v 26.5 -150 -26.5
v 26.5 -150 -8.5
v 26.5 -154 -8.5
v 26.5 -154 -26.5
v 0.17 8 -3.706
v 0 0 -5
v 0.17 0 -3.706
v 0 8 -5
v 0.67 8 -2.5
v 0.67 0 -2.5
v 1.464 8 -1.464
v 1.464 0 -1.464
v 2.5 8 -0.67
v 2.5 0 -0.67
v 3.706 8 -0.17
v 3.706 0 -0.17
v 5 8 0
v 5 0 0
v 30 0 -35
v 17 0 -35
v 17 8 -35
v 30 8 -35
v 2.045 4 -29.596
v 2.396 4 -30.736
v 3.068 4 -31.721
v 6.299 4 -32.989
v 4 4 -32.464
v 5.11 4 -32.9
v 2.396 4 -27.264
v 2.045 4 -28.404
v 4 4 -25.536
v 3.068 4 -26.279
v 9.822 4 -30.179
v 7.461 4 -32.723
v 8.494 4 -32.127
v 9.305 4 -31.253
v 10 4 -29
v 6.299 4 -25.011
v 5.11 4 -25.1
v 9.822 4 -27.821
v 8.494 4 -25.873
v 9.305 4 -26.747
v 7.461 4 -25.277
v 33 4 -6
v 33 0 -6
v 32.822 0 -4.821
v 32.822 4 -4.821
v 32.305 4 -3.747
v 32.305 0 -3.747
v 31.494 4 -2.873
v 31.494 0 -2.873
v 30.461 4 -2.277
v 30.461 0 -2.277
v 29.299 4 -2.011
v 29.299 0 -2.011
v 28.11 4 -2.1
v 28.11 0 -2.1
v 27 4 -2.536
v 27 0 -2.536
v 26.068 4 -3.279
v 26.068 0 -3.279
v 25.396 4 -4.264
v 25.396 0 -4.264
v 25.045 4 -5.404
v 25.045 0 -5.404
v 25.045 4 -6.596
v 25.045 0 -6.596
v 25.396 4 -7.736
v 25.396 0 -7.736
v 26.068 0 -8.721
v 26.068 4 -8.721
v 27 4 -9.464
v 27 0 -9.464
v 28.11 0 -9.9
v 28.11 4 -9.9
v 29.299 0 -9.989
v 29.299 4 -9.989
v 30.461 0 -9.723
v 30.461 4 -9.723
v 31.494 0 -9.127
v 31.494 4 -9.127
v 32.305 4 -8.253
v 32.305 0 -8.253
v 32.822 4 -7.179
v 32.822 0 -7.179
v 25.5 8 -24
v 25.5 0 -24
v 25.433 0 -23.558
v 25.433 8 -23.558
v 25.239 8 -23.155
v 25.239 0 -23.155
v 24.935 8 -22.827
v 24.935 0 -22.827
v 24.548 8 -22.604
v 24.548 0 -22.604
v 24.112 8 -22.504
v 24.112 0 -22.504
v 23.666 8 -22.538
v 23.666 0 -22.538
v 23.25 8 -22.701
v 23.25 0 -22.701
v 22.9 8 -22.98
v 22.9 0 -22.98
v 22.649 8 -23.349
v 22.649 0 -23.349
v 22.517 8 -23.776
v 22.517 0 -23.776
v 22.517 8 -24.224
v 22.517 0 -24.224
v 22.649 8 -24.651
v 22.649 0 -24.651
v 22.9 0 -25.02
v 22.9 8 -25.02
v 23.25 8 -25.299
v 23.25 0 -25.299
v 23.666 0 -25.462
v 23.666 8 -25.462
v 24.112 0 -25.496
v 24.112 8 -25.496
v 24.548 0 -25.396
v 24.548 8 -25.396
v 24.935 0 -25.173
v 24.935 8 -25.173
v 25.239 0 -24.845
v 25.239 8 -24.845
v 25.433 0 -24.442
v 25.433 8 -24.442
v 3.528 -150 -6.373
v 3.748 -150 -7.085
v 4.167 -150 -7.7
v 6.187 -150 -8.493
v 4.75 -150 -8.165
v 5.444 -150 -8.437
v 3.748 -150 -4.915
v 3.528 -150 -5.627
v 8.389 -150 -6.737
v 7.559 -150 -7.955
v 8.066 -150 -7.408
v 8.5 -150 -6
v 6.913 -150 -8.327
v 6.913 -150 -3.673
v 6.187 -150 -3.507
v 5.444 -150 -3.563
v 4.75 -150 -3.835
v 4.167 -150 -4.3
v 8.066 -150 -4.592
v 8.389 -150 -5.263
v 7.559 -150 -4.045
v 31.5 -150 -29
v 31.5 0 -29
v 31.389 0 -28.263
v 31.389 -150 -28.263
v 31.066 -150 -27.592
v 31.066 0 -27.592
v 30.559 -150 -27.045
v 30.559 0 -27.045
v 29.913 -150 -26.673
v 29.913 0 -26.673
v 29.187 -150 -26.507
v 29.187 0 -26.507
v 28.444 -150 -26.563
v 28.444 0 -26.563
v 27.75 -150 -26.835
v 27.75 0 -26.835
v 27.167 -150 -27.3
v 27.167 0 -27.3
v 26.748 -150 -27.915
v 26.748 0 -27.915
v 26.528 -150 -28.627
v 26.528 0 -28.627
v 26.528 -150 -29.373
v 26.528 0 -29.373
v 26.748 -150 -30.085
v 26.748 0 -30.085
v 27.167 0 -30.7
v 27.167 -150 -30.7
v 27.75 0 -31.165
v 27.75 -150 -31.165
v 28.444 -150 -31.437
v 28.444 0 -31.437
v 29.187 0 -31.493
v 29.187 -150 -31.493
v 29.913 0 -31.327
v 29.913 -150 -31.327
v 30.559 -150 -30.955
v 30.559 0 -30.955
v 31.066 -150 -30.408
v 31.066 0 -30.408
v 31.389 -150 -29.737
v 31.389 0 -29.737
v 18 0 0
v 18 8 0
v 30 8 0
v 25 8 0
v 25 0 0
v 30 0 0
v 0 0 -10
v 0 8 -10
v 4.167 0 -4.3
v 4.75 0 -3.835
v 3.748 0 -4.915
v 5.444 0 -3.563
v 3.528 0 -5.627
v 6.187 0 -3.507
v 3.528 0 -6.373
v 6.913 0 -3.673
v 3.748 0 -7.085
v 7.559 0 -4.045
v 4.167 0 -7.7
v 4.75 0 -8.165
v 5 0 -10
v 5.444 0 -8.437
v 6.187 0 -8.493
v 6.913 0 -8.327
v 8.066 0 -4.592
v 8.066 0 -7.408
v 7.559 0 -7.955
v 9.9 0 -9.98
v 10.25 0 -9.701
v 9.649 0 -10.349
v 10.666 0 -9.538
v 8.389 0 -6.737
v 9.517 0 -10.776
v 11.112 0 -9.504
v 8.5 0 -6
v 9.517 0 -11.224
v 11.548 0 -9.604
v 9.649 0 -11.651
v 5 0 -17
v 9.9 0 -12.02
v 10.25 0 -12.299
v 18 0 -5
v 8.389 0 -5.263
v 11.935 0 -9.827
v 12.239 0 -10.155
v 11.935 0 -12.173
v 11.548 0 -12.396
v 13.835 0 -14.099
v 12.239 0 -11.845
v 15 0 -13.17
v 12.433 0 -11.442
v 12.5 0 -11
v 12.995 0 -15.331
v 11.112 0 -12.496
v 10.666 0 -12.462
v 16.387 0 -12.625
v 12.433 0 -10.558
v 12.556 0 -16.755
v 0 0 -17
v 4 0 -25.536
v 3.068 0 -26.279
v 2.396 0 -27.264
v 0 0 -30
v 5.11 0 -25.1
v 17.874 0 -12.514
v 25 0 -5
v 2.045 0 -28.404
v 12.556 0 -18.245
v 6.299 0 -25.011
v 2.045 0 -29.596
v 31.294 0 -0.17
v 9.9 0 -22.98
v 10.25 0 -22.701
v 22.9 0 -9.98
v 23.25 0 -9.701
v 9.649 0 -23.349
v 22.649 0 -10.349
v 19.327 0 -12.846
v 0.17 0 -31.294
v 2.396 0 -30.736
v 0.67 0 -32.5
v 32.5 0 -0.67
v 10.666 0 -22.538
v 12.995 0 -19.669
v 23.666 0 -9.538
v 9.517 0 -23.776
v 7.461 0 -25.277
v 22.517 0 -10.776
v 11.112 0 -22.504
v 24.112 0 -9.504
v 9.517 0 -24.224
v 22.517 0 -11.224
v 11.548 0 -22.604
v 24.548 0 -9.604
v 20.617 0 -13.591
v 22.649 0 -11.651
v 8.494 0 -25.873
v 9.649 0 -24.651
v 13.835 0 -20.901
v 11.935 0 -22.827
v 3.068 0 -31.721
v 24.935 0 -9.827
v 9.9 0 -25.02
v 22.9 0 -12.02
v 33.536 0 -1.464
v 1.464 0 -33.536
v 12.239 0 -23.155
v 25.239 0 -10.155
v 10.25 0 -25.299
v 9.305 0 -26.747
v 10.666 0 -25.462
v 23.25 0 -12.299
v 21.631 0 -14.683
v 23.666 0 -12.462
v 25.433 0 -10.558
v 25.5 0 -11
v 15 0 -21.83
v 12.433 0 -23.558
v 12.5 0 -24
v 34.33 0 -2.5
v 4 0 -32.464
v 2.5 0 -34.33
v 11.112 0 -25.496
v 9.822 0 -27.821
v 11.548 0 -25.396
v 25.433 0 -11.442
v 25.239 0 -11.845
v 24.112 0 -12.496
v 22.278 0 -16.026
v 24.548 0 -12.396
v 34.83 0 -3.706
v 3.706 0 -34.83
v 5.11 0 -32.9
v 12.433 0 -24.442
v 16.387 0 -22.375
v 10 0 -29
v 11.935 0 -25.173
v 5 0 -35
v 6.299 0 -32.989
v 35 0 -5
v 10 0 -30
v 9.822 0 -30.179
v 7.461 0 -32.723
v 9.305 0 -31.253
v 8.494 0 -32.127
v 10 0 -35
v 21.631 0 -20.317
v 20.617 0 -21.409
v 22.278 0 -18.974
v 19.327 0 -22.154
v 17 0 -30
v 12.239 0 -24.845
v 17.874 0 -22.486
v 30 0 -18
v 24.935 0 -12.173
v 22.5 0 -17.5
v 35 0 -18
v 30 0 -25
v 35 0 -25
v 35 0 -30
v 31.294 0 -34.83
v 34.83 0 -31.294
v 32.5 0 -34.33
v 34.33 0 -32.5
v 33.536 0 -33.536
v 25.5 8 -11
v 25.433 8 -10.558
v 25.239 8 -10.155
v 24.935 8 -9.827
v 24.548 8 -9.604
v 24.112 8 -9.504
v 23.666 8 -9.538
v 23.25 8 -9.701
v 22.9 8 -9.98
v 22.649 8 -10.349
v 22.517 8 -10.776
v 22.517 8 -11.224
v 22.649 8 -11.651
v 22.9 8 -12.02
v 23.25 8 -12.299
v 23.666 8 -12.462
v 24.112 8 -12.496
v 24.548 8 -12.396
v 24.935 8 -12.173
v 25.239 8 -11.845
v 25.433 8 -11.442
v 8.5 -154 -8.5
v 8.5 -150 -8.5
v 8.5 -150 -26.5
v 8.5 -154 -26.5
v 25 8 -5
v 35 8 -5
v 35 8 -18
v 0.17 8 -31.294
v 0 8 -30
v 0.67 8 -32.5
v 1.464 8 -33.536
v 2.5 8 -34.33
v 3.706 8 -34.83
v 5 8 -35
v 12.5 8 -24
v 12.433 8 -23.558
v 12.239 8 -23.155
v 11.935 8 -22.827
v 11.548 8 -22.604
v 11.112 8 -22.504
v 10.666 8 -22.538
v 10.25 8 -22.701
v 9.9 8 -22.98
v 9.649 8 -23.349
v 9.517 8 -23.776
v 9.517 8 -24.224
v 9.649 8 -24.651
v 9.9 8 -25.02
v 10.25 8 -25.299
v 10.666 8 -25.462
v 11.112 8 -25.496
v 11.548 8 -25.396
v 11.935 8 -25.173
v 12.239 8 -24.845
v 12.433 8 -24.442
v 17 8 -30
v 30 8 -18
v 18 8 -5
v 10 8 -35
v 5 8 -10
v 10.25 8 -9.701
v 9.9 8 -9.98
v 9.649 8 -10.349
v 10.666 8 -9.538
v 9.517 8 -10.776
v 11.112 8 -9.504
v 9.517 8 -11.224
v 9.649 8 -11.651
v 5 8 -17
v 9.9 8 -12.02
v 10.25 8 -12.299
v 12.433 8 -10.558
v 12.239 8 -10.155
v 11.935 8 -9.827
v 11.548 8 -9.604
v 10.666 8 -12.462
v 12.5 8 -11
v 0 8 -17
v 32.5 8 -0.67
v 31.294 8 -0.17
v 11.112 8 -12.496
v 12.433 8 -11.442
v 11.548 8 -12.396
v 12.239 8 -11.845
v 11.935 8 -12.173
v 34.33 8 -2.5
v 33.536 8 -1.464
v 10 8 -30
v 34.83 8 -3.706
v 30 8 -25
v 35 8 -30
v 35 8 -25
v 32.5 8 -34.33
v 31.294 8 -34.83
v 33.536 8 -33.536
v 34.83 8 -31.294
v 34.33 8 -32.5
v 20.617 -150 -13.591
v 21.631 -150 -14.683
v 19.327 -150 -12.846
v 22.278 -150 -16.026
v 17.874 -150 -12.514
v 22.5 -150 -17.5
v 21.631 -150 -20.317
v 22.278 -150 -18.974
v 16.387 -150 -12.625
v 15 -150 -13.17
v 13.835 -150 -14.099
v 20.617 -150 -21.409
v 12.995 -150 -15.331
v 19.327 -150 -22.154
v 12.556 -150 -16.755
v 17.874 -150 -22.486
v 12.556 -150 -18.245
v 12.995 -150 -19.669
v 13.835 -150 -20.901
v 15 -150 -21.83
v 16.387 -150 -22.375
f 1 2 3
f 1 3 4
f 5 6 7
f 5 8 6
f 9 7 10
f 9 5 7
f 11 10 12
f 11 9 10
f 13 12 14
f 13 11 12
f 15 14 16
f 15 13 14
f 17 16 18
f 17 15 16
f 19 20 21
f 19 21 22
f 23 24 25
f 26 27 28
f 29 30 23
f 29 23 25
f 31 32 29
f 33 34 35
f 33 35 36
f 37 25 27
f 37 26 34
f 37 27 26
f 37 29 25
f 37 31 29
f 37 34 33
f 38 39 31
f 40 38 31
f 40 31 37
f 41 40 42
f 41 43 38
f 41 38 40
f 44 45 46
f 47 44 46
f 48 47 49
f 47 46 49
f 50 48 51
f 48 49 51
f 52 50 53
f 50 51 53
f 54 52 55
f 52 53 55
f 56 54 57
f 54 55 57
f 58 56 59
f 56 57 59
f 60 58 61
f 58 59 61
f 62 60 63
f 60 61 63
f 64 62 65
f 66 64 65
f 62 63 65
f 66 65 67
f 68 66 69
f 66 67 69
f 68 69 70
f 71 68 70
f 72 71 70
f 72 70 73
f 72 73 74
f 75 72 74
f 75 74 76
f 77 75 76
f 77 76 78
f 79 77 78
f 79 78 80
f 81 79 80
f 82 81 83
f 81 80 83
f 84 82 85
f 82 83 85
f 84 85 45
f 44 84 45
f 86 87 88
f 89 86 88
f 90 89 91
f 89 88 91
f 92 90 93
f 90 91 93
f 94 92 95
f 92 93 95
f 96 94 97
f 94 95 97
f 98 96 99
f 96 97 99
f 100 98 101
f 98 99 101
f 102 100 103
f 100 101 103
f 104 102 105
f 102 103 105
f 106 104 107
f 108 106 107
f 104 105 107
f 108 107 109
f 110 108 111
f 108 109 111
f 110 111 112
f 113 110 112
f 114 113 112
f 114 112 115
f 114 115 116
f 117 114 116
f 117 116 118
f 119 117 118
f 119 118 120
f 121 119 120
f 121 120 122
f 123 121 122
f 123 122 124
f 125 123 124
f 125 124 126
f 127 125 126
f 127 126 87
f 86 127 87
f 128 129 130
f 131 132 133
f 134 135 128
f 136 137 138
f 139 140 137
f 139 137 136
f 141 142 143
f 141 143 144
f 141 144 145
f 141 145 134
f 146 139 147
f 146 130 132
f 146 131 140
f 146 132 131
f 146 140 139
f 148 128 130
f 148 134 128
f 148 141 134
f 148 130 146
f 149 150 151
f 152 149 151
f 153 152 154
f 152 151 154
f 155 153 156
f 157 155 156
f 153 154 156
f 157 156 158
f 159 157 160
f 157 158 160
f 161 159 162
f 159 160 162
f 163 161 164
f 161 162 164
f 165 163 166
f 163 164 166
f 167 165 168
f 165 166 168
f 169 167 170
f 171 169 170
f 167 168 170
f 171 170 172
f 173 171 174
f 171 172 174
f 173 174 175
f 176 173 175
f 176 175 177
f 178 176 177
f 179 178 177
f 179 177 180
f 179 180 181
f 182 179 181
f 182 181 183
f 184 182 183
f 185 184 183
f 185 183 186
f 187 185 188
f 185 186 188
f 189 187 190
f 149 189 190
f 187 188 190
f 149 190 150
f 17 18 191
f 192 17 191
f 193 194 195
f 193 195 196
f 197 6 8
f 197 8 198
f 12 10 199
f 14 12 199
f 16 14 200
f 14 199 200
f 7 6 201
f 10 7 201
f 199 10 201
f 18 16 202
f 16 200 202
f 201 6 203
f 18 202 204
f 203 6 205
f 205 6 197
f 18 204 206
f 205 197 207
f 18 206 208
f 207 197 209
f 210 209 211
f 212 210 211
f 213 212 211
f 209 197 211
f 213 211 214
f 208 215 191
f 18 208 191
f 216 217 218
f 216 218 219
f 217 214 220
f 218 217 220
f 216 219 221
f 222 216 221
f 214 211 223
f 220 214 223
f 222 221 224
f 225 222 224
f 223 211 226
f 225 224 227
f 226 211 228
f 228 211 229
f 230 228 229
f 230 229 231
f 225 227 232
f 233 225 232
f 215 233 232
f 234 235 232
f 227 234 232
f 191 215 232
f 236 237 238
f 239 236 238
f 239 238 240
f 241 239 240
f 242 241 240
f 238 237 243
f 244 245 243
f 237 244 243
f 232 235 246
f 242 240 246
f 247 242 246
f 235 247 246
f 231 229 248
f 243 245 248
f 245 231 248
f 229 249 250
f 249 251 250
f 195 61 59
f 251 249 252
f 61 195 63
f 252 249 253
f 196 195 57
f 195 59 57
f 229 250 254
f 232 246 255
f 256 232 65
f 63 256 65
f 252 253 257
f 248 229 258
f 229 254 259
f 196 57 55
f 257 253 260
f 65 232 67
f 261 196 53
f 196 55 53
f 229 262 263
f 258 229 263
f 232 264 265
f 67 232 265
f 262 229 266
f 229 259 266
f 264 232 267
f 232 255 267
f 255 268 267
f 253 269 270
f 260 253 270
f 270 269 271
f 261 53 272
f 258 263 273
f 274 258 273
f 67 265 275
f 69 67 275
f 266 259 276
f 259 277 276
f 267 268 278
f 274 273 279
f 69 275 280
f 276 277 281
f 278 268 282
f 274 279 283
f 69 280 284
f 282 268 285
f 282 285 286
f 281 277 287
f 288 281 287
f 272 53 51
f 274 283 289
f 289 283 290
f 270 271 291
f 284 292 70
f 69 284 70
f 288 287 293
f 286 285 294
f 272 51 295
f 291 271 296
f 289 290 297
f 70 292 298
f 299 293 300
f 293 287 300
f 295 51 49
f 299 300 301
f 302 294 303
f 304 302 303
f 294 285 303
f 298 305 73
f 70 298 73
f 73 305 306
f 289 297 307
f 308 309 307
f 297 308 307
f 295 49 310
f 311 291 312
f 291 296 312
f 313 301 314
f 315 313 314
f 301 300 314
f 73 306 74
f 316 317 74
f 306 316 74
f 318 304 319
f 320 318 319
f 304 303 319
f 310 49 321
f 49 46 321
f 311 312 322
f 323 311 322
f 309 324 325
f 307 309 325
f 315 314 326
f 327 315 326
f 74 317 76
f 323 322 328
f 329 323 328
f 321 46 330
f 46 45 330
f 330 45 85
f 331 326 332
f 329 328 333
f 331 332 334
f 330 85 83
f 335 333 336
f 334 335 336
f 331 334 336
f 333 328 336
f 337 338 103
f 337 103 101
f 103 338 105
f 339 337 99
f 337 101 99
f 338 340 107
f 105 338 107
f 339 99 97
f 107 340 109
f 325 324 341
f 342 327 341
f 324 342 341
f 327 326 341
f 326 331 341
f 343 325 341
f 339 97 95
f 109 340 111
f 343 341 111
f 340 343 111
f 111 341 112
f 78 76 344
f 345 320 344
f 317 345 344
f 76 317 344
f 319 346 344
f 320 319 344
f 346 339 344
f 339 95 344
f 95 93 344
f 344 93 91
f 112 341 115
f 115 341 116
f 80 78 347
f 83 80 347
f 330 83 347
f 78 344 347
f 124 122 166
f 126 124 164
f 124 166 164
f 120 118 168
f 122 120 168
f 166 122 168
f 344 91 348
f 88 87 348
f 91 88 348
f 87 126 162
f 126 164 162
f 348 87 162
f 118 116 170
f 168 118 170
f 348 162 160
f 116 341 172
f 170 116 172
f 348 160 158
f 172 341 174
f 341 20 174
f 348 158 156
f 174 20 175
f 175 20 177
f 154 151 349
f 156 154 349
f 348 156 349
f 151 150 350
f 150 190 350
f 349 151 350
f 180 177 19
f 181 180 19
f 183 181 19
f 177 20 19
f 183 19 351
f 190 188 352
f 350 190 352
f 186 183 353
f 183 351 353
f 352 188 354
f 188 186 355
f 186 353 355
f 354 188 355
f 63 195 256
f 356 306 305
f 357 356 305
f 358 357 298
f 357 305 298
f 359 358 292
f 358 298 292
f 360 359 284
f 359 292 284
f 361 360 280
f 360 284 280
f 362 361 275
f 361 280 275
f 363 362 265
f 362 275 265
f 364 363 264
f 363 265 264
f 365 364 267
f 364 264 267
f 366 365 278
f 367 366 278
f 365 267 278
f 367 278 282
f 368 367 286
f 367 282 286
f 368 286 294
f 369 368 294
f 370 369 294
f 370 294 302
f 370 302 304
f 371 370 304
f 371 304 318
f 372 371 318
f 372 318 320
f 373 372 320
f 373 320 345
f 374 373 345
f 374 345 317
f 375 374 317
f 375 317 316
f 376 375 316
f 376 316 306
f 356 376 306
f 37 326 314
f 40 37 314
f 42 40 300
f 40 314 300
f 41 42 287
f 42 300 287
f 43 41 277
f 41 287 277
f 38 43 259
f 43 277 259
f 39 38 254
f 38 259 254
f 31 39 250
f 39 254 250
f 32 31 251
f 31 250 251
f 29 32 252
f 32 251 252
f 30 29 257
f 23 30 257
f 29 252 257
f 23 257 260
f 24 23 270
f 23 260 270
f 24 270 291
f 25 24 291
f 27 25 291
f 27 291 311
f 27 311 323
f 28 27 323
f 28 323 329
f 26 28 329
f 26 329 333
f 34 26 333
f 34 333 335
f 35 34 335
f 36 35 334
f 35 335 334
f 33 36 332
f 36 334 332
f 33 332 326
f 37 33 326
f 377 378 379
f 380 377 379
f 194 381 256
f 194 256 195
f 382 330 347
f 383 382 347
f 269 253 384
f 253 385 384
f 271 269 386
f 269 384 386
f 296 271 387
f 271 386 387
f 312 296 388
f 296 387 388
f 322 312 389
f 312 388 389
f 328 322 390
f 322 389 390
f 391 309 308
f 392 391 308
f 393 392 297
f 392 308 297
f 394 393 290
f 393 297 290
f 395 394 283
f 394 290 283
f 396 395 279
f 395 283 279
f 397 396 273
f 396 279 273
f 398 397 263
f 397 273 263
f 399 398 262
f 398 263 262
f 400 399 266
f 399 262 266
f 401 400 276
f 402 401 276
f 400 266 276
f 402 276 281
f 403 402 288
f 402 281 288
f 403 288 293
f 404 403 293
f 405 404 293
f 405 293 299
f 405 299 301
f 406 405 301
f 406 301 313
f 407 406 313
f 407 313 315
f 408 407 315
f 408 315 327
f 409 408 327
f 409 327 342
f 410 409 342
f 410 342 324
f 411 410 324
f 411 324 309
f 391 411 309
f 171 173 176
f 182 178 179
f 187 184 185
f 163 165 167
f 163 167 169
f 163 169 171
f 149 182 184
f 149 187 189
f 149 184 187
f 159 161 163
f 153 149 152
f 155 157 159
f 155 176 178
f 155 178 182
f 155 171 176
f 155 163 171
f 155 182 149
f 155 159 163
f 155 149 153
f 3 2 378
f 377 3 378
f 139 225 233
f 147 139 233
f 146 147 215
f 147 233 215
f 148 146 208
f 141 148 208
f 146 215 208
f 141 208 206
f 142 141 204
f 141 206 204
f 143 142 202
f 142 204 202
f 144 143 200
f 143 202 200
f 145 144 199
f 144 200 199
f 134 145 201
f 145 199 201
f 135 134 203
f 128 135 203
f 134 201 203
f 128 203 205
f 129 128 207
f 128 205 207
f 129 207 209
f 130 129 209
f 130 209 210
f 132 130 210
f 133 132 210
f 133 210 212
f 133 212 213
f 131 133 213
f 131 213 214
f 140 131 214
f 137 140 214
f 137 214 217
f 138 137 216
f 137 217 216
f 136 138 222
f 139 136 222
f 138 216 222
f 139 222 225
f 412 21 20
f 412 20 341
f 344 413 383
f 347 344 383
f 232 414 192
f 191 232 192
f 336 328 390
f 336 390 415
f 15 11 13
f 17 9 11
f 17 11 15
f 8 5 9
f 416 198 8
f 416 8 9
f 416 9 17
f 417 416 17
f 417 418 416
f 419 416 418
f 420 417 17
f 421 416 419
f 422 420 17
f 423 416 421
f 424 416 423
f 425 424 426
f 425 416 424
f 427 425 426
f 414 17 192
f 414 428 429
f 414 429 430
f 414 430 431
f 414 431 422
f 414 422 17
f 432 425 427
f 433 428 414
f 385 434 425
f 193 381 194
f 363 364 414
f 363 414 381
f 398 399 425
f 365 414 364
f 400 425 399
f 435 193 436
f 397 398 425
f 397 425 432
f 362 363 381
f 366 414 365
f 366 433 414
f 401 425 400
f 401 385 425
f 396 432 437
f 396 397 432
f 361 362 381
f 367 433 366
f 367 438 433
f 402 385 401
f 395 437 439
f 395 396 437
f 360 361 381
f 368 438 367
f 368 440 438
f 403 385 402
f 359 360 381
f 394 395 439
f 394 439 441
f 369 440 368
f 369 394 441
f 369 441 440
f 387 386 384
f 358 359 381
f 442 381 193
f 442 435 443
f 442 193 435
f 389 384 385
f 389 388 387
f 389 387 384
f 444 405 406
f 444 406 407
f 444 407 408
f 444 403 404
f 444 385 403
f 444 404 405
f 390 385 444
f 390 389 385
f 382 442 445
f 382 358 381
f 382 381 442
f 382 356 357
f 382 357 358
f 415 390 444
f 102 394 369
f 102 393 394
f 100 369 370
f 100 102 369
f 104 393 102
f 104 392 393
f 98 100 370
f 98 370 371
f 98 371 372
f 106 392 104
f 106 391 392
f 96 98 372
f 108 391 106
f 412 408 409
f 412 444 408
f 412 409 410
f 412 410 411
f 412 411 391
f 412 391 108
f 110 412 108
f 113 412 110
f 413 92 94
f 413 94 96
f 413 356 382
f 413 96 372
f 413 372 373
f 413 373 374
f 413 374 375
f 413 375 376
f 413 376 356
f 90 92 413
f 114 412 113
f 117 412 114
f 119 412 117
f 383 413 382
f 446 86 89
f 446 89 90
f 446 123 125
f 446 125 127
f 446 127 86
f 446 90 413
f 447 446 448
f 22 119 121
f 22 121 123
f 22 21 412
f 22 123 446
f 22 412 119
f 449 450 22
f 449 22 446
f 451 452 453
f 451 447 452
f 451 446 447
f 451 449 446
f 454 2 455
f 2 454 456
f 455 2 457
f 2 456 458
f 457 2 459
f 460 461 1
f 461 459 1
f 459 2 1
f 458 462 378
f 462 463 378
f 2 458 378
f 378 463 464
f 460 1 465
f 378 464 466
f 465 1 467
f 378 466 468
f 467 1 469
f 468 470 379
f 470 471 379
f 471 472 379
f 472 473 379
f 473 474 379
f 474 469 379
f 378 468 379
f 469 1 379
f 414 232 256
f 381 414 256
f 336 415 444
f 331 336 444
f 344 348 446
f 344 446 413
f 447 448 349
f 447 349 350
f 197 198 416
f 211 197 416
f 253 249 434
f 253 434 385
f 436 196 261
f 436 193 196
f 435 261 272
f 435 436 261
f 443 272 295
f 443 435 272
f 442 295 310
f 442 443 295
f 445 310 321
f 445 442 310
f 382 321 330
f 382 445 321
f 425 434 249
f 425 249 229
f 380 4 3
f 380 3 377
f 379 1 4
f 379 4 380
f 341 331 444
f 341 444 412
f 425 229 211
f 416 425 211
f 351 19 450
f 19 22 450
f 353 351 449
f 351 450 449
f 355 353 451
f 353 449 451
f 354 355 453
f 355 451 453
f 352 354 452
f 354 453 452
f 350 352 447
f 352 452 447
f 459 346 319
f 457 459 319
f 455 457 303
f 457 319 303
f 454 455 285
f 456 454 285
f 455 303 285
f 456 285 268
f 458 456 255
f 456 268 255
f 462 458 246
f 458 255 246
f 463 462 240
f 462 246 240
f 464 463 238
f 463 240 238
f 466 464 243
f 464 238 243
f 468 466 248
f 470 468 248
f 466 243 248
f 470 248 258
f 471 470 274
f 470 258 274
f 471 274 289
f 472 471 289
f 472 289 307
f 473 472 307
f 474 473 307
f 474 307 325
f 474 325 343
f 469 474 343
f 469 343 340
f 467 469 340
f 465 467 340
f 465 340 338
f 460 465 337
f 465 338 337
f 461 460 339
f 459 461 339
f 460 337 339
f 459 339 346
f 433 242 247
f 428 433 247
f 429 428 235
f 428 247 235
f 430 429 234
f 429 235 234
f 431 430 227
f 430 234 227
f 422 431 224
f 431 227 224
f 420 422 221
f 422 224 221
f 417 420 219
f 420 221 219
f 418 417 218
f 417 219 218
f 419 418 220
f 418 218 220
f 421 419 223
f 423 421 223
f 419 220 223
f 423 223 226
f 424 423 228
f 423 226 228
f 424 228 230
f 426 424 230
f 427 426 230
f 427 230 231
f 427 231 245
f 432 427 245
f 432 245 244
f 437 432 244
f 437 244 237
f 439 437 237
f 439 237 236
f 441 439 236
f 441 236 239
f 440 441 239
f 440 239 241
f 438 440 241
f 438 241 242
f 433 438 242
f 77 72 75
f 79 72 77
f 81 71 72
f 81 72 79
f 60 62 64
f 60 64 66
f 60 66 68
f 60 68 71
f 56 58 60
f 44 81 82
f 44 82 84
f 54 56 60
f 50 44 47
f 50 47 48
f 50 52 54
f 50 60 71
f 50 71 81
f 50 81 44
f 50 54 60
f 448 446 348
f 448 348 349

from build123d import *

# Parameters (mm, degrees)
SKETCH1_W           = 35
SKETCH1_H           = 35
BOSS_EXTRUDE1_DEPTH = 8
SKETCH2_W           = 7
SKETCH2_H           = 5
SKETCH2_W_2         = 5
SKETCH2_H_2         = 7
SKETCH2_R           = 1.5
CUT_EXTRUDE1_DEPTH  = 51.139804547
SKETCH2_5_R         = 4
SKETCH2_5_R_2       = 1.5
CUT_EXTRUDE2_DEPTH  = 4
SKETCH2_7_R         = 2.5
SKETCH2_7_R_2       = 5
BOSS_EXTRUDE2_DEPTH = 150
SKETCH3_W           = 18
SKETCH3_H           = 18
BOSS_EXTRUDE3_DEPTH = 4
FILLET1_R           = 5


with BuildPart() as part:
    # Sketch1 → Boss-Extrude1 (new body)
    with BuildSketch(Plane(origin=(0, 0, 0), x_dir=(1, 0, 0), z_dir=(0, 1, 0))):
        with Locations((17.5, 17.5)):
            Rectangle(SKETCH1_W, SKETCH1_H)
    extrude(amount=BOSS_EXTRUDE1_DEPTH)

    # Sketch2 → Cut-Extrude1 (cut, through all)
    with BuildSketch(Plane.XZ):
        with Locations((21.5, -2.5)):
            Rectangle(SKETCH2_W, SKETCH2_H)
        with Locations((2.5, -13.5)):
            Rectangle(SKETCH2_W_2, SKETCH2_H_2)
        with Locations((32.5, -21.5)):
            Rectangle(SKETCH2_W_2, SKETCH2_H_2)
        with Locations((13.5, -32.5)):
            Rectangle(SKETCH2_W, SKETCH2_H)
        with Locations((11, -11)):
            Circle(SKETCH2_R)
        with Locations((24, -11)):
            Circle(SKETCH2_R)
        with Locations((24, -24)):
            Circle(SKETCH2_R)
        with Locations((11, -24)):
            Circle(SKETCH2_R)
    extrude(amount=-CUT_EXTRUDE1_DEPTH, mode=Mode.SUBTRACT)

    # Sketch2<5> → Cut-Extrude2 (cut)
    with BuildSketch(Plane.XZ):
        with Locations((29, -6)):
            Circle(SKETCH2_5_R)
        with Locations((6, -29)):
            Circle(SKETCH2_5_R)
        with Locations((11, -11)):
            Circle(SKETCH2_5_R_2)
    extrude(amount=-CUT_EXTRUDE2_DEPTH, mode=Mode.SUBTRACT)

    # Sketch2<7> → Boss-Extrude2 (add)
    with BuildSketch(Plane.XZ):
        with Locations((6, -6)):
            Circle(SKETCH2_7_R)
        with Locations((29, -29)):
            Circle(SKETCH2_7_R)
        with Locations((17.5, -17.5)):
            Circle(SKETCH2_7_R_2)
    extrude(amount=BOSS_EXTRUDE2_DEPTH)

    # Sketch3 → Boss-Extrude3 (add)
    with BuildSketch(Plane(origin=(0, -150, 0), x_dir=(-1, 0, 0), z_dir=(0, -1, 0))):
        with Locations((-17.5, 17.5)):
            Rectangle(SKETCH3_W, SKETCH3_H)
    extrude(amount=BOSS_EXTRUDE3_DEPTH)

    # Fillet1
    fillet1_edges = [part.edges().sort_by_distance(p)[0] for p in [
        (35, 4, -35),
        (0, 4, -35),
        (0, 4, 0),
        (35, 4, 0),
    ]]
    fillet(fillet1_edges, radius=FILLET1_R)


solid = part.part
